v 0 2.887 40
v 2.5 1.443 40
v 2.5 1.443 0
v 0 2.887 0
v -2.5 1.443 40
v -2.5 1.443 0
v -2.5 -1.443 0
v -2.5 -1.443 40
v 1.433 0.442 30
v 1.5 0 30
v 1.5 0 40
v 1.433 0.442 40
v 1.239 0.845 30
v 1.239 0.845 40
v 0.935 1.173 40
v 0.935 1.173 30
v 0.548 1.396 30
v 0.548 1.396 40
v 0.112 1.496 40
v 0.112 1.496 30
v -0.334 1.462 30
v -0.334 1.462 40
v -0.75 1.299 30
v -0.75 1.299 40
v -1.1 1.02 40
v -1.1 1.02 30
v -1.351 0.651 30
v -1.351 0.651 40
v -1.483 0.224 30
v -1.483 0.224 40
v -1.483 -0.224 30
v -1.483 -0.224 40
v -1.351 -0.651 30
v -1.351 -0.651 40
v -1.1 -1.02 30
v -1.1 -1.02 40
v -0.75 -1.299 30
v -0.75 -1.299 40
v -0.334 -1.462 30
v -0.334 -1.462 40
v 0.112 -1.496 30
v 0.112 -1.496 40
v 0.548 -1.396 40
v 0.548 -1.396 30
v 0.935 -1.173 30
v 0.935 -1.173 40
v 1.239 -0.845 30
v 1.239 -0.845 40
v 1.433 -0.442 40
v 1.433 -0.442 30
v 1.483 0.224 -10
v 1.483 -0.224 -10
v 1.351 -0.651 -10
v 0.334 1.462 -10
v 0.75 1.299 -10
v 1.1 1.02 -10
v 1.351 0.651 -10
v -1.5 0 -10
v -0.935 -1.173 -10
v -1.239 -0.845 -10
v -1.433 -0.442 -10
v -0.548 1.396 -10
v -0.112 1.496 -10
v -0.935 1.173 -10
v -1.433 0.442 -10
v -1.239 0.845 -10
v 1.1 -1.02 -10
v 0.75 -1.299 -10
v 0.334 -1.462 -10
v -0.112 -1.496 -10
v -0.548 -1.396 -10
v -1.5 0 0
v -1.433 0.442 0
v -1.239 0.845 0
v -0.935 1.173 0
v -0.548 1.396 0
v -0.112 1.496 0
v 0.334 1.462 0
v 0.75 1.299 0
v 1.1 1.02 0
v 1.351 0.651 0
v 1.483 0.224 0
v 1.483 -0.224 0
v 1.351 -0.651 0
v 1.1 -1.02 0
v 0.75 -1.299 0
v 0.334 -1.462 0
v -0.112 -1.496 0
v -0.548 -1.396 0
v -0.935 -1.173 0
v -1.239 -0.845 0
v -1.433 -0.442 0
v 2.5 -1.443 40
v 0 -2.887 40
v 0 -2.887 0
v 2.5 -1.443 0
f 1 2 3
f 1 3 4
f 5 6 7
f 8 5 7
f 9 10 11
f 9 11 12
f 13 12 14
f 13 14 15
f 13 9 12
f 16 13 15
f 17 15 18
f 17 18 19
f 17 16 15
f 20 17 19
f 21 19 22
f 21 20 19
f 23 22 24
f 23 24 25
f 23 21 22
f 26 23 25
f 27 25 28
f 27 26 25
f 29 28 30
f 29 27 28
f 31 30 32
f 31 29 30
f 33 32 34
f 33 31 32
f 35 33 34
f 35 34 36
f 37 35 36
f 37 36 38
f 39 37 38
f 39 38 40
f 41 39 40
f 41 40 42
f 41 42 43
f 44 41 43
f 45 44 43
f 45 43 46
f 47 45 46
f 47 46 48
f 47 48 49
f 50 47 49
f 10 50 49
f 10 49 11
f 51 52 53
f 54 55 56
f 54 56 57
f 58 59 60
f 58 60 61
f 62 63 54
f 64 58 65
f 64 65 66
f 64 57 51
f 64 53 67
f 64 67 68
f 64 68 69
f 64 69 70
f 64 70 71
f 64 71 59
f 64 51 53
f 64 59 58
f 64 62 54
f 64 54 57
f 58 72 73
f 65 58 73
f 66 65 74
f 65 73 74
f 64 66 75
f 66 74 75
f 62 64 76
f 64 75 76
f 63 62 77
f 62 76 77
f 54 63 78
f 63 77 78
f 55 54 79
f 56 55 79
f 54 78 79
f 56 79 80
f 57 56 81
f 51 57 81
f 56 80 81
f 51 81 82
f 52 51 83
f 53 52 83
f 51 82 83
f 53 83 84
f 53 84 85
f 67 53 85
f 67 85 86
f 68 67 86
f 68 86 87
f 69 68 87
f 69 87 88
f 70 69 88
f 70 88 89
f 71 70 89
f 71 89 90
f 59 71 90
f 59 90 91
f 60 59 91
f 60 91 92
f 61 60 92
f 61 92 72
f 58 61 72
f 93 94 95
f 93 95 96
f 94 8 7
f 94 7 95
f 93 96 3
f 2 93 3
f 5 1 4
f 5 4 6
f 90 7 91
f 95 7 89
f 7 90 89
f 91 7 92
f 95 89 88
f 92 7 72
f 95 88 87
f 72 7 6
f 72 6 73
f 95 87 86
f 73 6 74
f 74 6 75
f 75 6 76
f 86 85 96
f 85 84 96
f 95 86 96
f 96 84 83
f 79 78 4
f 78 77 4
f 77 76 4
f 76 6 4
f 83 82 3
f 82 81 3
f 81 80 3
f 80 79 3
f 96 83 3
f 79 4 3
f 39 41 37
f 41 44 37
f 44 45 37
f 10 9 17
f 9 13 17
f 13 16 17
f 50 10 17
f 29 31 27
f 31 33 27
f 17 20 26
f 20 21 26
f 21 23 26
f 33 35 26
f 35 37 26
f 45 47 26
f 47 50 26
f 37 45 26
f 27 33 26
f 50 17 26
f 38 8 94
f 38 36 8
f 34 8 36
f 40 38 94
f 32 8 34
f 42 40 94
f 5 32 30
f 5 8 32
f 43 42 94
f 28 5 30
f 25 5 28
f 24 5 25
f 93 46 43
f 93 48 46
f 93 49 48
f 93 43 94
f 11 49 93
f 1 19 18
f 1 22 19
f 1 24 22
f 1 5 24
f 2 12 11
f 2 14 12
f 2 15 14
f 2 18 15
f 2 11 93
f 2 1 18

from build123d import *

# Parameters (mm, degrees)
ESQUISSE1_R             = 1.5
BOSS_EXTRU_2_DEPTH      = 40
ESQUISSE3_R             = 1.5
BOSS_EXTRU_3_DEPTH      = 10
BOSS_EXTRU_3_DEPTH_BACK = 30


with BuildPart() as part:
    # Esquisse1 → Boss.-Extru.2 (new body)
    with BuildSketch(Plane.XY):
        Polygon((0, -2.886751346), (2.5, -1.443375673), (2.5, 1.443375673), (0, 2.886751346), (-2.5, 1.443375673), (-2.5, -1.443375673), align=None)
        Circle(ESQUISSE1_R, mode=Mode.SUBTRACT)
    extrude(amount=BOSS_EXTRU_2_DEPTH)

    # Esquisse3 → Boss.-Extru.3 (add, two sides)
    with BuildSketch(Plane(origin=(0, 0, 0), x_dir=(-1, 0, 0), z_dir=(0, 0, -1))) as boss_extru_3_sk:
        Circle(ESQUISSE3_R)
    extrude(amount=BOSS_EXTRU_3_DEPTH)
    extrude(boss_extru_3_sk.sketch, amount=-BOSS_EXTRU_3_DEPTH_BACK)


solid = part.part
